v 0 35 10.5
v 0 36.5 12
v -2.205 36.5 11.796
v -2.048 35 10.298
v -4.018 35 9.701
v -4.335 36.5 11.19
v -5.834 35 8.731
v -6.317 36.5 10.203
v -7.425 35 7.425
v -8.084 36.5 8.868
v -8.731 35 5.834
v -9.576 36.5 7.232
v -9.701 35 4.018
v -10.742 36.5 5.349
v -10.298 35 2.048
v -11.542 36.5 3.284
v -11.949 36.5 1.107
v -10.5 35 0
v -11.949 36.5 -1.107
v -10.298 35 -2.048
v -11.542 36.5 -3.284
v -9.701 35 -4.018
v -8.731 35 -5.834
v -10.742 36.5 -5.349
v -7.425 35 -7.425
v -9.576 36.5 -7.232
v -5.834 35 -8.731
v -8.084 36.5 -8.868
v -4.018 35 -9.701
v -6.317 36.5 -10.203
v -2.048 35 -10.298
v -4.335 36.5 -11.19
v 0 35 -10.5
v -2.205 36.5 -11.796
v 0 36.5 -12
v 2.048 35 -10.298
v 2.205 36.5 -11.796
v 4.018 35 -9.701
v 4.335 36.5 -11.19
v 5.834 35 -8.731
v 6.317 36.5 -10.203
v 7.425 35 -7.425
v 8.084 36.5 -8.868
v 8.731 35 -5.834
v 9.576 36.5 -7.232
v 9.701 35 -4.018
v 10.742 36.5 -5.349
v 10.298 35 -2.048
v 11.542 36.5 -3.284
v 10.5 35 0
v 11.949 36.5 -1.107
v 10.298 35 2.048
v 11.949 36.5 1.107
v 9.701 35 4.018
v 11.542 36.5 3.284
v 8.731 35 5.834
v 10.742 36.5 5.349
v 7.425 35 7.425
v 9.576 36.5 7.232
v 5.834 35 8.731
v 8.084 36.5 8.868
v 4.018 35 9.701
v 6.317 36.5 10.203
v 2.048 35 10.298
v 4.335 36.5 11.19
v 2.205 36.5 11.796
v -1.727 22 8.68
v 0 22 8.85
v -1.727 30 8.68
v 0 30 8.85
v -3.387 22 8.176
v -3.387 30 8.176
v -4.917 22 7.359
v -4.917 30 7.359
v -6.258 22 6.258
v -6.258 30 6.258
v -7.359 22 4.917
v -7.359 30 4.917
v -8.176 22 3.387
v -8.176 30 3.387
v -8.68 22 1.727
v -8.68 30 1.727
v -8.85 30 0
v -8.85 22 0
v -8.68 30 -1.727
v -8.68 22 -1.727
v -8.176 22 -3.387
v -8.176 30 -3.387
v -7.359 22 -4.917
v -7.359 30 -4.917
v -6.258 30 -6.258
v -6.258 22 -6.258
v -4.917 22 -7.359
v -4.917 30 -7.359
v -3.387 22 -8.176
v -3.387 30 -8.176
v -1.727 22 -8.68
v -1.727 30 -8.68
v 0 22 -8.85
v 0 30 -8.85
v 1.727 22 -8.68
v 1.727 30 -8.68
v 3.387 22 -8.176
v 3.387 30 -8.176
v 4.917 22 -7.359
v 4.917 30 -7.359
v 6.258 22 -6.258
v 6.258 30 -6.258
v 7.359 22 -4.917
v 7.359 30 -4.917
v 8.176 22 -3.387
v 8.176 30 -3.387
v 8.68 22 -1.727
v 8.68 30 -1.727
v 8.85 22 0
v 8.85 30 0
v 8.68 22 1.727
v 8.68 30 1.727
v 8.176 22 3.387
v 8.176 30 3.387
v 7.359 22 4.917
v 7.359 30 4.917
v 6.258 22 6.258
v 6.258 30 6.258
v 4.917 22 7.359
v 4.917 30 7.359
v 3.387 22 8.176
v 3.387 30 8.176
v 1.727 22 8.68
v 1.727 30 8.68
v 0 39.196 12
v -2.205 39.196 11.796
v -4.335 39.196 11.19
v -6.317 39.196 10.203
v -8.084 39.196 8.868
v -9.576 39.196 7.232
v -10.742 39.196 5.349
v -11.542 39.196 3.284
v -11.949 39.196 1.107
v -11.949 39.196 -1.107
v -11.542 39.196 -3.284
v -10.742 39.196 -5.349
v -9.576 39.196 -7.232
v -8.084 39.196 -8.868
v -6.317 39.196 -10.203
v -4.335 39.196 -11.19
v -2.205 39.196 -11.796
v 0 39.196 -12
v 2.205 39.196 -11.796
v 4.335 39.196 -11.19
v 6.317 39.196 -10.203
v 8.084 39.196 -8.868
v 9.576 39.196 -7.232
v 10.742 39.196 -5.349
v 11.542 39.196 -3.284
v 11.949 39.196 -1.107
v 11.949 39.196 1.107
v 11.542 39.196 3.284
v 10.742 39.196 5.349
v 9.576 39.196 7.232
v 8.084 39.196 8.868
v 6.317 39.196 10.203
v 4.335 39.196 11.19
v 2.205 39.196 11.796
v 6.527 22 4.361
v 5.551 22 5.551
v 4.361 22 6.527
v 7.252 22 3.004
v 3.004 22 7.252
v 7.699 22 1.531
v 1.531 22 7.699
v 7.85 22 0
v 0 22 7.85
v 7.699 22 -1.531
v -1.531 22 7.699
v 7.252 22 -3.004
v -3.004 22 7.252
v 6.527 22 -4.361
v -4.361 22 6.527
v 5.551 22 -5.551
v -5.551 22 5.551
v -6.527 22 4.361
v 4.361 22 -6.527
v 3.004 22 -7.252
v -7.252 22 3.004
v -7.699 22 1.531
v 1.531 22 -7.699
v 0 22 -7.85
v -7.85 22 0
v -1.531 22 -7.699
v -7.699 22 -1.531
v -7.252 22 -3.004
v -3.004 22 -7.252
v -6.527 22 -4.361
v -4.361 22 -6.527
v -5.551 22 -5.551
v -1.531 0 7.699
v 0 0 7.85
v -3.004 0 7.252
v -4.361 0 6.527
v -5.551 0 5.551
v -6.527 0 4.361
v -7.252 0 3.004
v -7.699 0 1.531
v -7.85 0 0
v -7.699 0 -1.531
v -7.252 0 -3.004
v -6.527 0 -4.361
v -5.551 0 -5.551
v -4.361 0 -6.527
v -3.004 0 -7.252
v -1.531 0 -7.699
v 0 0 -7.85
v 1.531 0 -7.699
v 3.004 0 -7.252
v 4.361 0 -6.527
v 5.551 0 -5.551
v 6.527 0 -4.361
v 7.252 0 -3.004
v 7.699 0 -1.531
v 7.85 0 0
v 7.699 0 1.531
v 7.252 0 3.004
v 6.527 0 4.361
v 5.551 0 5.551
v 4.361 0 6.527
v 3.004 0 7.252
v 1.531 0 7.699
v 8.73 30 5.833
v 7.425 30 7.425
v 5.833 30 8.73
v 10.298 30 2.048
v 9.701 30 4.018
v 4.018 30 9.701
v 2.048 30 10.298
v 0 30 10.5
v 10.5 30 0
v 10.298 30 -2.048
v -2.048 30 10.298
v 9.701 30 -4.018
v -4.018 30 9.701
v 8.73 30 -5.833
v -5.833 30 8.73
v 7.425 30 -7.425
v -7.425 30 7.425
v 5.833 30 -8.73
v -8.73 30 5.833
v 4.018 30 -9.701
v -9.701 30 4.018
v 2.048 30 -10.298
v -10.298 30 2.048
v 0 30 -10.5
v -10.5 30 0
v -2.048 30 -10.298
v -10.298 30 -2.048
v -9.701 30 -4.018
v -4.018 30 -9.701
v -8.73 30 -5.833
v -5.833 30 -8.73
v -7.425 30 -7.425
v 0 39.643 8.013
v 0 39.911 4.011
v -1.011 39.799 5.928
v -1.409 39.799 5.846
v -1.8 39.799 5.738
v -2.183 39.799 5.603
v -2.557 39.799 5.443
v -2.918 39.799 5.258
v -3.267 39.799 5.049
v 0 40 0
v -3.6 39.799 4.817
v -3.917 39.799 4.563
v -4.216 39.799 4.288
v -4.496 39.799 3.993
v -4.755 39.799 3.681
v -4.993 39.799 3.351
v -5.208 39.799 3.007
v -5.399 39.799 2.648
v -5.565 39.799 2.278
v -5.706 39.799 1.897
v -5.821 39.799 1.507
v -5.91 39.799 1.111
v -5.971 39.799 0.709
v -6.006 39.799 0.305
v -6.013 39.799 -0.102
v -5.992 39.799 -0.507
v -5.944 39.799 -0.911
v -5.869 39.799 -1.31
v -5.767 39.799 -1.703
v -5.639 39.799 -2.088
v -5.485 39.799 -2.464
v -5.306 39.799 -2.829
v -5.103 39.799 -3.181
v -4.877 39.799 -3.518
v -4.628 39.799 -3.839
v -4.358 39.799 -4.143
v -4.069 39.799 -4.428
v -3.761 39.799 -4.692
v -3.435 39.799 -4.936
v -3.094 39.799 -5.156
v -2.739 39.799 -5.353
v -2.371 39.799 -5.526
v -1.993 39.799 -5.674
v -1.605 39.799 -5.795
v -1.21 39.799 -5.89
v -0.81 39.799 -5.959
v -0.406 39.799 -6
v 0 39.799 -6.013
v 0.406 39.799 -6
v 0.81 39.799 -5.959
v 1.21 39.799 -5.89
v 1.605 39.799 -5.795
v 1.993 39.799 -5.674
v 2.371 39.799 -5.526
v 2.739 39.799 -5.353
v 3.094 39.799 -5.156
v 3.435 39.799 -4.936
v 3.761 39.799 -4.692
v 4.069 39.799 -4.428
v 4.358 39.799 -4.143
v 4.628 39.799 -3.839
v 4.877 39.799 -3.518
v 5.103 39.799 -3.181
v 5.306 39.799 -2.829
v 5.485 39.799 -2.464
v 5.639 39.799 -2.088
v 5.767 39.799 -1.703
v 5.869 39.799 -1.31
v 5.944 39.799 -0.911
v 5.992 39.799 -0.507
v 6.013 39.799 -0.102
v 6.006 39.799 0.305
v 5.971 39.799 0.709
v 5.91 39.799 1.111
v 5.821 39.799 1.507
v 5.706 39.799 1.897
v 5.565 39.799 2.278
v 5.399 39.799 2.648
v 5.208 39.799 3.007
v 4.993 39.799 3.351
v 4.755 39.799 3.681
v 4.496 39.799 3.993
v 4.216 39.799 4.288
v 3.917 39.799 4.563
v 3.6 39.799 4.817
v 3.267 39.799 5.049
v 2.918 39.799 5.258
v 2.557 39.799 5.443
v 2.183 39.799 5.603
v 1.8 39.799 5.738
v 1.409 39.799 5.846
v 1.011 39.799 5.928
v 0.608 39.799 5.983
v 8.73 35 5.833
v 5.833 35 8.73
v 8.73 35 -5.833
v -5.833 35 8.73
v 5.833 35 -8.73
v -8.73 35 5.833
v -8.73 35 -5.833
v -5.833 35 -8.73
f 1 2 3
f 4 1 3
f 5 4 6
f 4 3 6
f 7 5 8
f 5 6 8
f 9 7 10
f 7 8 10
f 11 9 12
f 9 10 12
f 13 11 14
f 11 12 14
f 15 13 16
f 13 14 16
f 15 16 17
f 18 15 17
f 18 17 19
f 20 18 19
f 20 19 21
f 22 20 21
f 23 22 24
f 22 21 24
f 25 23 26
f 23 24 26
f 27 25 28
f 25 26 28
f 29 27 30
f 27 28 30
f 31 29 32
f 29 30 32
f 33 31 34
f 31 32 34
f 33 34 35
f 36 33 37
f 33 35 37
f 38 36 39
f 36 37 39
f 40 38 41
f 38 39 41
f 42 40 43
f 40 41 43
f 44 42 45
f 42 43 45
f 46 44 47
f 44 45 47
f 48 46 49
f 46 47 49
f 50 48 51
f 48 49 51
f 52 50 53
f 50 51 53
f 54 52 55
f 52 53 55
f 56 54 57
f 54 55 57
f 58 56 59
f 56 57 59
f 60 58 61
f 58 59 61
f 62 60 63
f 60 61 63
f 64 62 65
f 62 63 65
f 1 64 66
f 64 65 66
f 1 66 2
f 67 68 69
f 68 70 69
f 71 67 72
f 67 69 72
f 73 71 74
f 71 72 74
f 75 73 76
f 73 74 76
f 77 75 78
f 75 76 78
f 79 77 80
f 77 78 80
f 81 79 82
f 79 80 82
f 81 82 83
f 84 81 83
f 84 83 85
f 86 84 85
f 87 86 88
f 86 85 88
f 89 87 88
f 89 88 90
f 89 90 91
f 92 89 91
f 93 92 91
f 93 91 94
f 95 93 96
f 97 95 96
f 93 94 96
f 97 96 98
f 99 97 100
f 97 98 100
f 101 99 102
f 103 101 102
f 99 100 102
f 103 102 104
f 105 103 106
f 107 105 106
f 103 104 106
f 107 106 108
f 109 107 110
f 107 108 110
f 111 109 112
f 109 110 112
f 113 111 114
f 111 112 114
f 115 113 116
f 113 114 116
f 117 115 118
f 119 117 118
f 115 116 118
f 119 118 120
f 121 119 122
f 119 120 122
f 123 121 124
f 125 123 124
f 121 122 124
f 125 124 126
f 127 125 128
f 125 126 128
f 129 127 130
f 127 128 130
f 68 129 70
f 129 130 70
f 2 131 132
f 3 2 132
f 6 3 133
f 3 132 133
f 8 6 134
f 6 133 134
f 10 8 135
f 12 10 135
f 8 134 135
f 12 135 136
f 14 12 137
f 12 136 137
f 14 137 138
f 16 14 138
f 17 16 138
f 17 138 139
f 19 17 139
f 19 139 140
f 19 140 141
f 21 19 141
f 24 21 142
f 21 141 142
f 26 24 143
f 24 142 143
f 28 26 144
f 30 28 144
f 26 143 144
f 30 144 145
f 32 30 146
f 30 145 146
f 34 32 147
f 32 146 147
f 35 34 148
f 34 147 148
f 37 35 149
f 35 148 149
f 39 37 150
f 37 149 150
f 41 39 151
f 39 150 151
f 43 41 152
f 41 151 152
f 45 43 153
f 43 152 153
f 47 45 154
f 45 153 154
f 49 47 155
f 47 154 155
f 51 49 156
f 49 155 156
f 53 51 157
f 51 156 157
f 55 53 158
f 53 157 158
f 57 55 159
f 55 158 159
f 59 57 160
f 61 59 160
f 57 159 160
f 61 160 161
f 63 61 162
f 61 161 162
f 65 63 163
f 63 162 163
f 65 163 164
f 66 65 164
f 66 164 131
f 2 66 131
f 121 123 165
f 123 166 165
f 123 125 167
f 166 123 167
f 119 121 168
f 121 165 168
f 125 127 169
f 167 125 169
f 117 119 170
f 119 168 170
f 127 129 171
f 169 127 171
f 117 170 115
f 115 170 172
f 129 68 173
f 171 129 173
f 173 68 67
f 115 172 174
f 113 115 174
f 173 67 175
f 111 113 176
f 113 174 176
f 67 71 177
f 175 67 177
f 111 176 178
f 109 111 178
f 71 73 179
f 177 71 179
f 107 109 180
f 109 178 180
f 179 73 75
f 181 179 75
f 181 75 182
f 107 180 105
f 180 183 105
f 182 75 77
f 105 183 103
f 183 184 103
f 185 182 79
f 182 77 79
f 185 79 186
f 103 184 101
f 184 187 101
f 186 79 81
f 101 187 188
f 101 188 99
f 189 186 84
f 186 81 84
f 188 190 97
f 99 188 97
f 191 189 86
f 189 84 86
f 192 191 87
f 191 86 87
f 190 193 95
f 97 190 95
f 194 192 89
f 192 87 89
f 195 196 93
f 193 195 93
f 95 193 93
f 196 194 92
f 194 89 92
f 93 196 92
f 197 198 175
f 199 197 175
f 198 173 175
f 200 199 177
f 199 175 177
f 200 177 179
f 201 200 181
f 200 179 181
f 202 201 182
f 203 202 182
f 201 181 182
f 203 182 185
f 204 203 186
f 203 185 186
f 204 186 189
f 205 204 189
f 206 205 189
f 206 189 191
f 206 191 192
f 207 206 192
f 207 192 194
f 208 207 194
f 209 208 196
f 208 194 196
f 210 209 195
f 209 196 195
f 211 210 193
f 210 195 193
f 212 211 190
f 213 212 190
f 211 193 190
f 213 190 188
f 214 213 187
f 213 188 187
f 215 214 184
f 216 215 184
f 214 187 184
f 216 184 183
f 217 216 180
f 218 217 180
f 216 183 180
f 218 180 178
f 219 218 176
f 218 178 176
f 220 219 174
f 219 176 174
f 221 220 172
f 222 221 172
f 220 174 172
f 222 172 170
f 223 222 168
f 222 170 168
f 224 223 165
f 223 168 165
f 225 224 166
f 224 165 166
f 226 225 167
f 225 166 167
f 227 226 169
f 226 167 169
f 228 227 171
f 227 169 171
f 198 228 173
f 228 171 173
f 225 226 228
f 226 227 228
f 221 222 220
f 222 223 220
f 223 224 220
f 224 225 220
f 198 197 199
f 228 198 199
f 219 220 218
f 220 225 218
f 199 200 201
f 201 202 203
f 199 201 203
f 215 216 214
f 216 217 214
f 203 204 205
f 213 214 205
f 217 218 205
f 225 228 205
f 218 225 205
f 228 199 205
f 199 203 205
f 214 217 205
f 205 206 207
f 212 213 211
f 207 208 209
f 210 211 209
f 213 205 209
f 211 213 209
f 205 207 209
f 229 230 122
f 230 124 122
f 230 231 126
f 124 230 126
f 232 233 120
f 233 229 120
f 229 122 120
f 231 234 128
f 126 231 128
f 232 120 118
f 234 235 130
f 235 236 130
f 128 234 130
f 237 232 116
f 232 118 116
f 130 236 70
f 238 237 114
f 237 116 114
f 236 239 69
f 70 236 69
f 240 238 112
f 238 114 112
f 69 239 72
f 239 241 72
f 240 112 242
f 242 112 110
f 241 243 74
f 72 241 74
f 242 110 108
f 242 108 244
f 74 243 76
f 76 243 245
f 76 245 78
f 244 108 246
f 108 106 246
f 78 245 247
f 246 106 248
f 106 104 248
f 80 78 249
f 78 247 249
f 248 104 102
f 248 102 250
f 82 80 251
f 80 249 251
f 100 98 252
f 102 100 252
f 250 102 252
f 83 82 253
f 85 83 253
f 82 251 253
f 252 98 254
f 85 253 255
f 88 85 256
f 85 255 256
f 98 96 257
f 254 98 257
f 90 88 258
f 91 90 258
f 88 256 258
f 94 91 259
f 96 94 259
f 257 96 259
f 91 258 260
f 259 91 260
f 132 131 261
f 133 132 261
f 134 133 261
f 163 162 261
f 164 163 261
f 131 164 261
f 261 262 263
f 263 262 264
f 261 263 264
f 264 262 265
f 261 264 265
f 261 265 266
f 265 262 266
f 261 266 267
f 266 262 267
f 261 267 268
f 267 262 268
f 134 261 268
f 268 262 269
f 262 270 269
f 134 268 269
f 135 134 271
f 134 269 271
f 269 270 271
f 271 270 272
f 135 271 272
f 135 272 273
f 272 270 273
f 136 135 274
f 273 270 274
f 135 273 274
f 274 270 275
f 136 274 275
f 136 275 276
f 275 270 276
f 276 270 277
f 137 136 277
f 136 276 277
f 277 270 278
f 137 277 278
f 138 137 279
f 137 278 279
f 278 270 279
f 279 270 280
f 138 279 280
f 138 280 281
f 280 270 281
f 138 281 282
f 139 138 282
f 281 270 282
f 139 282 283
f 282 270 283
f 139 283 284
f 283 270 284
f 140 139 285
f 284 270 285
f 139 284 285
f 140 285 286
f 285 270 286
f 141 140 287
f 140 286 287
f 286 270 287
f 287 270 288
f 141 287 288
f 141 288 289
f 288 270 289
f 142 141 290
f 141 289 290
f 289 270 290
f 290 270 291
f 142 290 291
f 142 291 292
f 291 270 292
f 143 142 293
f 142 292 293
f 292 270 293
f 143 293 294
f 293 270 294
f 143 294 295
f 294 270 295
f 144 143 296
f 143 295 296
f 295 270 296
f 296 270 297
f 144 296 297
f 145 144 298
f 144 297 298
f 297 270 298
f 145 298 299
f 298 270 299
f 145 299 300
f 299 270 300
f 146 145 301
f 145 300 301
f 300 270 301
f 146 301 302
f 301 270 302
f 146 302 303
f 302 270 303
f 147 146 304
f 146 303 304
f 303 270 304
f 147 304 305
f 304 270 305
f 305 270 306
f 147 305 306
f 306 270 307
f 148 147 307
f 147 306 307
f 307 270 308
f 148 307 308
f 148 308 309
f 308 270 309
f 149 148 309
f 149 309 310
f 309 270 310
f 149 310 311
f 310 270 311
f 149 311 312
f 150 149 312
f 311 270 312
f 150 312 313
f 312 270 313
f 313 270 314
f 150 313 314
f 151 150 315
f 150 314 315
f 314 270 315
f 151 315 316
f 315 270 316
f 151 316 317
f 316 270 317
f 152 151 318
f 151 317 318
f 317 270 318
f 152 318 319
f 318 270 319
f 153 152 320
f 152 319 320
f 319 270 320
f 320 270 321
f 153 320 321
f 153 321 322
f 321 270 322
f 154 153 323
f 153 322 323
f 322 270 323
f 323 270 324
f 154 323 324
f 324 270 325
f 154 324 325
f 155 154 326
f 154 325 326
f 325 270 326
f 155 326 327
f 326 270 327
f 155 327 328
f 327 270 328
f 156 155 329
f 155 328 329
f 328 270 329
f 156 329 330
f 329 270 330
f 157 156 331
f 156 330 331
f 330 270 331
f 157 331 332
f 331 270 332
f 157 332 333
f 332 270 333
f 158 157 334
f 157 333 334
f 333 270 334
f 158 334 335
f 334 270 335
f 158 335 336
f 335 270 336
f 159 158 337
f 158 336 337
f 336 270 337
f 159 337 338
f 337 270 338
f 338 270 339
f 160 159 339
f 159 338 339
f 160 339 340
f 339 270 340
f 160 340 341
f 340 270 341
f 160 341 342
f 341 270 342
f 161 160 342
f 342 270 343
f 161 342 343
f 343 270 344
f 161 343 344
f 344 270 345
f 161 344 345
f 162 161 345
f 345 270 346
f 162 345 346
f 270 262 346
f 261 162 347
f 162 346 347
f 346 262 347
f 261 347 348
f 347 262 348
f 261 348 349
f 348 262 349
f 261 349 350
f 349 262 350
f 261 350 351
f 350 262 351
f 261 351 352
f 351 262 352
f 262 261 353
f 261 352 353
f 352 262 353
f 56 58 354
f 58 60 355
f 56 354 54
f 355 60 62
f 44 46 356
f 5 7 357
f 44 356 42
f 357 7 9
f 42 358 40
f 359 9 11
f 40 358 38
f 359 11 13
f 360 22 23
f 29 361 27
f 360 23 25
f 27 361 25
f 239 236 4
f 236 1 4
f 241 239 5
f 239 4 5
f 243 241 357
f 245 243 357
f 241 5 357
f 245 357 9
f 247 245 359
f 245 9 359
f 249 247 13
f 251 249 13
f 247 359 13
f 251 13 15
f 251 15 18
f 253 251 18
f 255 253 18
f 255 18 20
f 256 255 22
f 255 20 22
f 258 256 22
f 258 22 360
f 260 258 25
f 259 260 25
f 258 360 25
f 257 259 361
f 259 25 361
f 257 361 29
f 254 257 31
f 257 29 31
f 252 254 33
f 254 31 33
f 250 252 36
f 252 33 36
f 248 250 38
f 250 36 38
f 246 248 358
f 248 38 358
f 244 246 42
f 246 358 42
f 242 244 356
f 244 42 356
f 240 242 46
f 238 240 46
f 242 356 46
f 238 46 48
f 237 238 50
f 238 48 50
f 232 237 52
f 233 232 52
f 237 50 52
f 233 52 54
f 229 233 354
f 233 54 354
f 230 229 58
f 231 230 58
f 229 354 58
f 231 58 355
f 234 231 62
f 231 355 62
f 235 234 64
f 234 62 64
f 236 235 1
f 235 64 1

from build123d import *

# Parameters (mm, degrees)
CHAMFER_1_SIZE = 1.5


with BuildPart() as part:
    # 草图1 → 旋转1 (revolve)
    with BuildSketch(Plane.XY, mode=Mode.PRIVATE) as revolve_1_sk:
        with BuildLine():
            Line((0, 0), (-7.85, 0))
            Line((-7.85, 0), (-7.85, 22))
            Line((-7.85, 22), (-8.85, 22))
            Line((-8.85, 22), (-8.85, 30))
            Line((-8.85, 30), (-10.5, 30))
            Line((-10.5, 30), (-10.5, 35))
            Line((-10.5, 35), (-12, 35))
            Line((-12, 35), (-12, 39.196412484))
            ThreePointArc((-12, 39.196412484), (-6.013438137, 39.798878399), (0, 40))
            Line((0, 40), (0, 0))
        make_face()
    revolve(revolve_1_sk.sketch.rotate(Axis((0, 40, 0), (0, -1, 0)), 270), axis=Axis((0, 40, 0), (0, -1, 0)))

    # 倒角1
    chamfer_1_edges = [part.edges().sort_by_distance(p)[0] for p in [
        (0, 35, -12),
    ]]
    chamfer(chamfer_1_edges, length=CHAMFER_1_SIZE - 0.0001)  # a hair under: the kernel refuses the full size


solid = part.part
